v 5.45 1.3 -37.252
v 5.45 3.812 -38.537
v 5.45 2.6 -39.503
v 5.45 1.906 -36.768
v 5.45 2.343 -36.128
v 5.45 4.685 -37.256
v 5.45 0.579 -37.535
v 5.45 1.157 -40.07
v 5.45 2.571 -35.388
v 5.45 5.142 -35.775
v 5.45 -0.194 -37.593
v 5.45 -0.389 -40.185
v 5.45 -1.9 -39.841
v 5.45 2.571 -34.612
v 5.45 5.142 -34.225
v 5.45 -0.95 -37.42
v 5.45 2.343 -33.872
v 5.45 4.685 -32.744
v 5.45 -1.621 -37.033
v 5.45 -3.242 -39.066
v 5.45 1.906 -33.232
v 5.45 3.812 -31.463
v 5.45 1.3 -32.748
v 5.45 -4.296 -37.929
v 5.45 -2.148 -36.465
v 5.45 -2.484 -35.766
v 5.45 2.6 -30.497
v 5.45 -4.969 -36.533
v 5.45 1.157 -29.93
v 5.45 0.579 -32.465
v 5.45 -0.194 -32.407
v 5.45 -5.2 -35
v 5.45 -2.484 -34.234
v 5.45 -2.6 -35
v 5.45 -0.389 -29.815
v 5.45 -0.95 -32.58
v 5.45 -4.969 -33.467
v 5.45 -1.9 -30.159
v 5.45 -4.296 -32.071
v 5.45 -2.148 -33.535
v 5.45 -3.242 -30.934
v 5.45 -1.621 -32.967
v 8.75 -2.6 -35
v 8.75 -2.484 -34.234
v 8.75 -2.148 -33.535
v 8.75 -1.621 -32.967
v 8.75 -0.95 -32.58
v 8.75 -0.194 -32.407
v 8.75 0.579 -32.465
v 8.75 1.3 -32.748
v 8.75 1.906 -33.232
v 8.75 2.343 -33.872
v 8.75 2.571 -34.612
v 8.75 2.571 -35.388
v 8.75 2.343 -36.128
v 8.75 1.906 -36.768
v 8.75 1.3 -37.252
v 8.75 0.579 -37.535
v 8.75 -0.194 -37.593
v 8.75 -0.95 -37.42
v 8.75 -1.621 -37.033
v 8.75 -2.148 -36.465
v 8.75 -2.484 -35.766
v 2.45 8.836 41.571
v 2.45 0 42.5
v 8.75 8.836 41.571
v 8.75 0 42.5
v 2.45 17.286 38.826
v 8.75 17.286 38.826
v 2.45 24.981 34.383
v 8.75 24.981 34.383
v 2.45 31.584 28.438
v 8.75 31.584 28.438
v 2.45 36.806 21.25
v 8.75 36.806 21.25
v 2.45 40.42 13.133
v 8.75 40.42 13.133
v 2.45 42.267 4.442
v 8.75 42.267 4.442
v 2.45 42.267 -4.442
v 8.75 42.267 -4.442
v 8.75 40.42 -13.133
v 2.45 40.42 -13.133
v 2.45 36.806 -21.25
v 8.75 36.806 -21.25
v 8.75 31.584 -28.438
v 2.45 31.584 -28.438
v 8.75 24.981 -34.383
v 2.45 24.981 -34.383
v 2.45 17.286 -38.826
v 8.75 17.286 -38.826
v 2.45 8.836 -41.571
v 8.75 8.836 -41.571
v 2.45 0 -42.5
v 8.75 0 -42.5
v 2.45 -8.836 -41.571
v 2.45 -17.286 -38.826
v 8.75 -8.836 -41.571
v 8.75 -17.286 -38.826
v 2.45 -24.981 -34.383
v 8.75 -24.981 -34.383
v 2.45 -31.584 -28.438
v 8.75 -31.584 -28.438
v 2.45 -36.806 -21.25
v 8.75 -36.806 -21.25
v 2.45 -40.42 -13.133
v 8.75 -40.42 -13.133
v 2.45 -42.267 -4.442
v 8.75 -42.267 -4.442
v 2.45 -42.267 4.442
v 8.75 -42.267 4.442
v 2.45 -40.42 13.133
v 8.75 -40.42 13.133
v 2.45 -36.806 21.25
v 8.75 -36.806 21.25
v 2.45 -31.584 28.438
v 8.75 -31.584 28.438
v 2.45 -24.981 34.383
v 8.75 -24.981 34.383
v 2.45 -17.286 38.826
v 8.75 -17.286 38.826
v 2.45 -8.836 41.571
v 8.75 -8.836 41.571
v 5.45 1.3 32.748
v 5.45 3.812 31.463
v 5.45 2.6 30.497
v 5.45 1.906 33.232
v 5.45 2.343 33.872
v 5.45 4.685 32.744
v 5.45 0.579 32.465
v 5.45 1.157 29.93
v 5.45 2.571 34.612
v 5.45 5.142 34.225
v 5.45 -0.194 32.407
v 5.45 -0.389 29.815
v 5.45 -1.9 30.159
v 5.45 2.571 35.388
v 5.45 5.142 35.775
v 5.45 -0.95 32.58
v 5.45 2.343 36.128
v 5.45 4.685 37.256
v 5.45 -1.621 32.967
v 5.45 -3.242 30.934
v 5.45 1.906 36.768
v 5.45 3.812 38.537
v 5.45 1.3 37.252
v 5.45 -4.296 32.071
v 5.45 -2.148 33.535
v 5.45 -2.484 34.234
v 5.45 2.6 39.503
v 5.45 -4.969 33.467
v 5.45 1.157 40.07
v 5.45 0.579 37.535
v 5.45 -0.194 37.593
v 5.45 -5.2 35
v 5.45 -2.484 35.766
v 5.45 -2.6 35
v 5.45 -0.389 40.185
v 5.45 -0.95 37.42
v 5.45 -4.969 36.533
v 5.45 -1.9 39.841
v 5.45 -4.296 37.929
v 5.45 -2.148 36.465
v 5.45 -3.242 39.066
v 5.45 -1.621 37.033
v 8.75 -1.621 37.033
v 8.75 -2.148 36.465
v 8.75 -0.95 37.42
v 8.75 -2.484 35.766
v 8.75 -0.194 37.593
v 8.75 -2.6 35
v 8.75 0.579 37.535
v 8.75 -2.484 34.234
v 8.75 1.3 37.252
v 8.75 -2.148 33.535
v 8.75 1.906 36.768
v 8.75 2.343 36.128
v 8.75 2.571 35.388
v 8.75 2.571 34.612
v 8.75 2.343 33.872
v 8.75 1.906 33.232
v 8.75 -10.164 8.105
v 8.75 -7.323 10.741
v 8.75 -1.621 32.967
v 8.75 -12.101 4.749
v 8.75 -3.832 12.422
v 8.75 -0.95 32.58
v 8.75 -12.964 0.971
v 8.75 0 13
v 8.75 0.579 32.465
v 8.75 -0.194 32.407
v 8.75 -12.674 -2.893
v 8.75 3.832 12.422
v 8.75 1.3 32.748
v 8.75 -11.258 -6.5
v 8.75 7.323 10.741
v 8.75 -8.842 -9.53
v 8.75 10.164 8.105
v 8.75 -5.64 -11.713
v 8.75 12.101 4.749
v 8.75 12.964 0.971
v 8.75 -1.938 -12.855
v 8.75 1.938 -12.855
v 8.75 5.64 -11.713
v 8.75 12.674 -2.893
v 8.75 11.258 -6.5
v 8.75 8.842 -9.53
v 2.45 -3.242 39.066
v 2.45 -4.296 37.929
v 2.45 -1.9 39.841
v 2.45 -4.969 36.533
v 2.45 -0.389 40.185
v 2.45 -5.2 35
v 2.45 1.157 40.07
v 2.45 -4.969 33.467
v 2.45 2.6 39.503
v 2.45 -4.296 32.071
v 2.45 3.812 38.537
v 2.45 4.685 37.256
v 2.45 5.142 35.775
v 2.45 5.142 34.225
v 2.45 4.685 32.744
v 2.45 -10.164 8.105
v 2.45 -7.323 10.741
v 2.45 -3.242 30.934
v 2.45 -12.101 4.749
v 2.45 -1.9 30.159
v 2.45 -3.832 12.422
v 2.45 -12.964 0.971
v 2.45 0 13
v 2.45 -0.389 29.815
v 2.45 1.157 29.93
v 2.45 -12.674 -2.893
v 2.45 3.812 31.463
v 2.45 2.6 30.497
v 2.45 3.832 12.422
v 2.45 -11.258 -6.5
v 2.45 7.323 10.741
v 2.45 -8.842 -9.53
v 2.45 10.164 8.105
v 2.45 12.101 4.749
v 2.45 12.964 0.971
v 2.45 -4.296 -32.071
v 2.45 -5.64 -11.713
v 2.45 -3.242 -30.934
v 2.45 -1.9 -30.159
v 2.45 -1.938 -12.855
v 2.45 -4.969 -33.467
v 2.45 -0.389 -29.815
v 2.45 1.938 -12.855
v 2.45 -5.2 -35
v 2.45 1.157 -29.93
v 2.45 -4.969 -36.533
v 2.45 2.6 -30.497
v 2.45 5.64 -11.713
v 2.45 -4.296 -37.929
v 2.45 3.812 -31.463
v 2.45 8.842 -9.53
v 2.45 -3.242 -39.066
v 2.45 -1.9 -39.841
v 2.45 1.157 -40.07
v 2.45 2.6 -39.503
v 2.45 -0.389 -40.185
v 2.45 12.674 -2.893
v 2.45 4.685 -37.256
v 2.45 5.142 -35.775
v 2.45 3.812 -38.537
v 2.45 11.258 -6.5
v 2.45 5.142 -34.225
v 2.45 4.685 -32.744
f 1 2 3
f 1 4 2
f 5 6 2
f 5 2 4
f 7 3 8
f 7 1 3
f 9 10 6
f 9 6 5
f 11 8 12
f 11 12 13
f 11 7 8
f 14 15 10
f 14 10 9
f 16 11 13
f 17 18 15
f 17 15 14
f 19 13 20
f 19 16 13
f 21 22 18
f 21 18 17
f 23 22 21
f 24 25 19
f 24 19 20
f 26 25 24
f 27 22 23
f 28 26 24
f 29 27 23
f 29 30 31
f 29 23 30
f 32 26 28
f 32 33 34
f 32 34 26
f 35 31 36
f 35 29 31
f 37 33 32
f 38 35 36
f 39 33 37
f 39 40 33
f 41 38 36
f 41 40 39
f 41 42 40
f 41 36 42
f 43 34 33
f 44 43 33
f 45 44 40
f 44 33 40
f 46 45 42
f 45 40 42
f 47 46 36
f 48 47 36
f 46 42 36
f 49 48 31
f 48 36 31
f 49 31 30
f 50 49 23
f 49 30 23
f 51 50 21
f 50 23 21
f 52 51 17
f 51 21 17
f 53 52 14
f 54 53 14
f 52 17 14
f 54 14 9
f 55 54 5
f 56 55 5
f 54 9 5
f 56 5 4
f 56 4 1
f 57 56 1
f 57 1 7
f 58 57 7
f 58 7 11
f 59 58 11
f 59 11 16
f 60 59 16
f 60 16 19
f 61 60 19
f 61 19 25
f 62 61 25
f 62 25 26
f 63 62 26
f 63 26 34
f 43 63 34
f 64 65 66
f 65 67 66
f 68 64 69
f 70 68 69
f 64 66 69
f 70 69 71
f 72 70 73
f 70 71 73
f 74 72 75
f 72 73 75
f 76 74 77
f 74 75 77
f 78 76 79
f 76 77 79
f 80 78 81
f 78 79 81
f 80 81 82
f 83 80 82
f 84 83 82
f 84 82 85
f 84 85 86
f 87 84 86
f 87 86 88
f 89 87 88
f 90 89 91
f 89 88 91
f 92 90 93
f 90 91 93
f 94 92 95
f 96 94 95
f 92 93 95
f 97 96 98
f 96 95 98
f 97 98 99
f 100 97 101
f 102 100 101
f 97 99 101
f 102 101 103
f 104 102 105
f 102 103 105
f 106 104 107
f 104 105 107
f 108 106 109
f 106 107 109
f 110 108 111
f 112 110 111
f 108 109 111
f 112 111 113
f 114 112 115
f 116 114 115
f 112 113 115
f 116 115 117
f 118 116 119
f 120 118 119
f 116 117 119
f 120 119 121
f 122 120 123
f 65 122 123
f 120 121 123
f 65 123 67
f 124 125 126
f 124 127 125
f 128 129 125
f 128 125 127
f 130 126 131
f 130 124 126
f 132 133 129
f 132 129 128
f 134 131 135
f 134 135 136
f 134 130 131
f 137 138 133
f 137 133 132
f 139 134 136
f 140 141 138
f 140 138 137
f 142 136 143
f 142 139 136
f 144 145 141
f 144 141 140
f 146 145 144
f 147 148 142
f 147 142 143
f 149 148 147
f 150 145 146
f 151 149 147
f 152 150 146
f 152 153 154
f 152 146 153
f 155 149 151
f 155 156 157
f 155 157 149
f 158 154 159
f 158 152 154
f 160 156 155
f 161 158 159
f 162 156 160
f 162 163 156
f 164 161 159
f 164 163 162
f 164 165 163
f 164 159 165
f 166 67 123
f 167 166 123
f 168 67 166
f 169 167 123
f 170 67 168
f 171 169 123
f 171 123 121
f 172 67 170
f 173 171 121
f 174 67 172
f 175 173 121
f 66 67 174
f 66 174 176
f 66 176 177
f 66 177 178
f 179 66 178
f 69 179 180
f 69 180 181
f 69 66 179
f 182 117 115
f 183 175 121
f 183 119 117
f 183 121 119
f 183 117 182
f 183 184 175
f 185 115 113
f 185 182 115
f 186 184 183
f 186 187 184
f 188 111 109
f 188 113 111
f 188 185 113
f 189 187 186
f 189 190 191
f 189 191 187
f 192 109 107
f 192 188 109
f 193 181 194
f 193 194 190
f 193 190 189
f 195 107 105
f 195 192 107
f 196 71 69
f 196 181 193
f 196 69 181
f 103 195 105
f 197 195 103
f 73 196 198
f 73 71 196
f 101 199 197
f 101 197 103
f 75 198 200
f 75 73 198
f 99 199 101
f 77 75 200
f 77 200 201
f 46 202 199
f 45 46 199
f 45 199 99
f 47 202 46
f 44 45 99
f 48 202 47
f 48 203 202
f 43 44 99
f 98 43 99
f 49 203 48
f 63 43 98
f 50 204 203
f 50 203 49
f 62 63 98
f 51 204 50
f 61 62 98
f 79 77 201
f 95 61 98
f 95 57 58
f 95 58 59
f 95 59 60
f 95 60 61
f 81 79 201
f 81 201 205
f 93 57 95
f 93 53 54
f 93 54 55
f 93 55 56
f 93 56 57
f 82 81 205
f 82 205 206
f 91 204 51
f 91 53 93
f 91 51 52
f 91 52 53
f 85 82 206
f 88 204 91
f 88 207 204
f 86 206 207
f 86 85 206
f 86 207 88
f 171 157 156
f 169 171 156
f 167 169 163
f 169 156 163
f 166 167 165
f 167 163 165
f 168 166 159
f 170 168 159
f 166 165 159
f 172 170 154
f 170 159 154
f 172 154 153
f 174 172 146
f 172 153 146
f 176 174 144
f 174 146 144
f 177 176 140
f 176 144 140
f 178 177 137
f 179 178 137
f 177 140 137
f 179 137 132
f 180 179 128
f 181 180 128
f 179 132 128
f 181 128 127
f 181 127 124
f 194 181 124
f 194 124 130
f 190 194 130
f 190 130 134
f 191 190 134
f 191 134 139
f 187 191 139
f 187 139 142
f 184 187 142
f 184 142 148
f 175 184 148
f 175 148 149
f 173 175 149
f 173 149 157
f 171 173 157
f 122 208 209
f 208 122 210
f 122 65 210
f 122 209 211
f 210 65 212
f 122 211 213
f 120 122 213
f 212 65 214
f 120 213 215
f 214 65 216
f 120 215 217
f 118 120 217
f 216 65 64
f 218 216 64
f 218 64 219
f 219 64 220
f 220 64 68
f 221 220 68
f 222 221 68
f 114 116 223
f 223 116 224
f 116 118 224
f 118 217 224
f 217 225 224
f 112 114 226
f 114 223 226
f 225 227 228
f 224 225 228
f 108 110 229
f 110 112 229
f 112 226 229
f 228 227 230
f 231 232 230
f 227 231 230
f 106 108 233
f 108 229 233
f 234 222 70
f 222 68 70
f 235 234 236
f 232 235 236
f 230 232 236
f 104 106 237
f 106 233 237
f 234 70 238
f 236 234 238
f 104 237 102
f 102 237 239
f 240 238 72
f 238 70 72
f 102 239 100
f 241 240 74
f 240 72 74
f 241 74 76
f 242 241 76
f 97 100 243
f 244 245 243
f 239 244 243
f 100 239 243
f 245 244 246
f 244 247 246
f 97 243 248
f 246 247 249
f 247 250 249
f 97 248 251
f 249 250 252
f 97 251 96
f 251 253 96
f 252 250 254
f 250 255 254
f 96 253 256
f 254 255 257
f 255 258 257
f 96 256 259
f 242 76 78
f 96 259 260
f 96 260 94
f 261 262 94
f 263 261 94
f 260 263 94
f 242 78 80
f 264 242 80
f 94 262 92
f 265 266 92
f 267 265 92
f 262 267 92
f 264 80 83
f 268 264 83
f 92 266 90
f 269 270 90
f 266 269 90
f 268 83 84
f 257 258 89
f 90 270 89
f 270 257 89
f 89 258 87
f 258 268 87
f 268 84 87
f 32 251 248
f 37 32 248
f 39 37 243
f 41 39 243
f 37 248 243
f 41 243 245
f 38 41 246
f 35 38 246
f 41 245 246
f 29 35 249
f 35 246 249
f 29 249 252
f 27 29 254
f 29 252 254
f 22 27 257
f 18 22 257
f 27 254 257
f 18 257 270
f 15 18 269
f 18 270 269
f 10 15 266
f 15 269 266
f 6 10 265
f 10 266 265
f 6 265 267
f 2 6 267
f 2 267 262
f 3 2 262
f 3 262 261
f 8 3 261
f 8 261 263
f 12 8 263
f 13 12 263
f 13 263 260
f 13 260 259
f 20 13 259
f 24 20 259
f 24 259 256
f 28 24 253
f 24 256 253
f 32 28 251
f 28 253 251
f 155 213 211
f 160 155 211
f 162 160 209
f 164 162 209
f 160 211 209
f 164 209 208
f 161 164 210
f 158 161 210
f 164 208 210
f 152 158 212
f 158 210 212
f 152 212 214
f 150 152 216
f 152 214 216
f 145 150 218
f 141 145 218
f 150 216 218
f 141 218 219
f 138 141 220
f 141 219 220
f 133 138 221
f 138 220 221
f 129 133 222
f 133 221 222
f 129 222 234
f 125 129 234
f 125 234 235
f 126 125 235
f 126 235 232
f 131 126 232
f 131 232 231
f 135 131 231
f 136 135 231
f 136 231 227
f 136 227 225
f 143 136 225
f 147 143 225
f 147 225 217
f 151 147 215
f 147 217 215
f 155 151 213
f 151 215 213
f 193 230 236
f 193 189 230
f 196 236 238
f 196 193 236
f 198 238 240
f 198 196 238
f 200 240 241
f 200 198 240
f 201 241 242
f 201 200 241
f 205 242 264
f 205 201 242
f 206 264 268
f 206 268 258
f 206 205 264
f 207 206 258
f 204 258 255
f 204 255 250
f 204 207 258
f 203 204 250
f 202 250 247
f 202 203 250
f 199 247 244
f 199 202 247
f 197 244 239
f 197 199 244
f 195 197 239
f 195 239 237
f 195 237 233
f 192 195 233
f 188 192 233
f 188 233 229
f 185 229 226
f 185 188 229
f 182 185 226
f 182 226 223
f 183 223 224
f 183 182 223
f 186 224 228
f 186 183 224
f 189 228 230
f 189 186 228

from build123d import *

# Parameters (mm, degrees)
F0_W     = 6.3
F0_H     = 29.5
F2_R     = 2.6
F3_DEPTH = 25
F4_R     = 5.2
F4_R_2   = 2.6
F5_DEPTH = 3


with BuildPart() as f1:
    # F0 (on Front) → F1 (revolve)
    with BuildSketch(Plane.XZ):
        with Locations((5.599999, 27.75)):
            Rectangle(F0_W, F0_H)
    revolve(axis=Axis((-4.686111, 0, 0), (-1, 0, 0)))

    # F2 (on face) → F3 (cut)
    with BuildSketch(Plane(origin=(2.449999, 0, 0), x_dir=(0, -1, 0), z_dir=(-1, 0, 0))):
        with Locations((0, 35)):
            Circle(F2_R)
        with Locations((0, -35)):
            Circle(F2_R)
    extrude(amount=-F3_DEPTH, mode=Mode.SUBTRACT)

    # F4 (on face) → F5 (cut)
    with BuildSketch(Plane(origin=(2.449999, 0, 0), x_dir=(0, -1, 0), z_dir=(-1, 0, 0))):
        with Locations((0, 35)):
            Circle(F4_R)
        with Locations((0, 35)):
            Circle(F4_R_2, mode=Mode.SUBTRACT)
        with Locations((0, -35)):
            Circle(F4_R)
        with Locations((0, -35)):
            Circle(F4_R_2, mode=Mode.SUBTRACT)
    extrude(amount=-F5_DEPTH, mode=Mode.SUBTRACT)


solid = f1.part
